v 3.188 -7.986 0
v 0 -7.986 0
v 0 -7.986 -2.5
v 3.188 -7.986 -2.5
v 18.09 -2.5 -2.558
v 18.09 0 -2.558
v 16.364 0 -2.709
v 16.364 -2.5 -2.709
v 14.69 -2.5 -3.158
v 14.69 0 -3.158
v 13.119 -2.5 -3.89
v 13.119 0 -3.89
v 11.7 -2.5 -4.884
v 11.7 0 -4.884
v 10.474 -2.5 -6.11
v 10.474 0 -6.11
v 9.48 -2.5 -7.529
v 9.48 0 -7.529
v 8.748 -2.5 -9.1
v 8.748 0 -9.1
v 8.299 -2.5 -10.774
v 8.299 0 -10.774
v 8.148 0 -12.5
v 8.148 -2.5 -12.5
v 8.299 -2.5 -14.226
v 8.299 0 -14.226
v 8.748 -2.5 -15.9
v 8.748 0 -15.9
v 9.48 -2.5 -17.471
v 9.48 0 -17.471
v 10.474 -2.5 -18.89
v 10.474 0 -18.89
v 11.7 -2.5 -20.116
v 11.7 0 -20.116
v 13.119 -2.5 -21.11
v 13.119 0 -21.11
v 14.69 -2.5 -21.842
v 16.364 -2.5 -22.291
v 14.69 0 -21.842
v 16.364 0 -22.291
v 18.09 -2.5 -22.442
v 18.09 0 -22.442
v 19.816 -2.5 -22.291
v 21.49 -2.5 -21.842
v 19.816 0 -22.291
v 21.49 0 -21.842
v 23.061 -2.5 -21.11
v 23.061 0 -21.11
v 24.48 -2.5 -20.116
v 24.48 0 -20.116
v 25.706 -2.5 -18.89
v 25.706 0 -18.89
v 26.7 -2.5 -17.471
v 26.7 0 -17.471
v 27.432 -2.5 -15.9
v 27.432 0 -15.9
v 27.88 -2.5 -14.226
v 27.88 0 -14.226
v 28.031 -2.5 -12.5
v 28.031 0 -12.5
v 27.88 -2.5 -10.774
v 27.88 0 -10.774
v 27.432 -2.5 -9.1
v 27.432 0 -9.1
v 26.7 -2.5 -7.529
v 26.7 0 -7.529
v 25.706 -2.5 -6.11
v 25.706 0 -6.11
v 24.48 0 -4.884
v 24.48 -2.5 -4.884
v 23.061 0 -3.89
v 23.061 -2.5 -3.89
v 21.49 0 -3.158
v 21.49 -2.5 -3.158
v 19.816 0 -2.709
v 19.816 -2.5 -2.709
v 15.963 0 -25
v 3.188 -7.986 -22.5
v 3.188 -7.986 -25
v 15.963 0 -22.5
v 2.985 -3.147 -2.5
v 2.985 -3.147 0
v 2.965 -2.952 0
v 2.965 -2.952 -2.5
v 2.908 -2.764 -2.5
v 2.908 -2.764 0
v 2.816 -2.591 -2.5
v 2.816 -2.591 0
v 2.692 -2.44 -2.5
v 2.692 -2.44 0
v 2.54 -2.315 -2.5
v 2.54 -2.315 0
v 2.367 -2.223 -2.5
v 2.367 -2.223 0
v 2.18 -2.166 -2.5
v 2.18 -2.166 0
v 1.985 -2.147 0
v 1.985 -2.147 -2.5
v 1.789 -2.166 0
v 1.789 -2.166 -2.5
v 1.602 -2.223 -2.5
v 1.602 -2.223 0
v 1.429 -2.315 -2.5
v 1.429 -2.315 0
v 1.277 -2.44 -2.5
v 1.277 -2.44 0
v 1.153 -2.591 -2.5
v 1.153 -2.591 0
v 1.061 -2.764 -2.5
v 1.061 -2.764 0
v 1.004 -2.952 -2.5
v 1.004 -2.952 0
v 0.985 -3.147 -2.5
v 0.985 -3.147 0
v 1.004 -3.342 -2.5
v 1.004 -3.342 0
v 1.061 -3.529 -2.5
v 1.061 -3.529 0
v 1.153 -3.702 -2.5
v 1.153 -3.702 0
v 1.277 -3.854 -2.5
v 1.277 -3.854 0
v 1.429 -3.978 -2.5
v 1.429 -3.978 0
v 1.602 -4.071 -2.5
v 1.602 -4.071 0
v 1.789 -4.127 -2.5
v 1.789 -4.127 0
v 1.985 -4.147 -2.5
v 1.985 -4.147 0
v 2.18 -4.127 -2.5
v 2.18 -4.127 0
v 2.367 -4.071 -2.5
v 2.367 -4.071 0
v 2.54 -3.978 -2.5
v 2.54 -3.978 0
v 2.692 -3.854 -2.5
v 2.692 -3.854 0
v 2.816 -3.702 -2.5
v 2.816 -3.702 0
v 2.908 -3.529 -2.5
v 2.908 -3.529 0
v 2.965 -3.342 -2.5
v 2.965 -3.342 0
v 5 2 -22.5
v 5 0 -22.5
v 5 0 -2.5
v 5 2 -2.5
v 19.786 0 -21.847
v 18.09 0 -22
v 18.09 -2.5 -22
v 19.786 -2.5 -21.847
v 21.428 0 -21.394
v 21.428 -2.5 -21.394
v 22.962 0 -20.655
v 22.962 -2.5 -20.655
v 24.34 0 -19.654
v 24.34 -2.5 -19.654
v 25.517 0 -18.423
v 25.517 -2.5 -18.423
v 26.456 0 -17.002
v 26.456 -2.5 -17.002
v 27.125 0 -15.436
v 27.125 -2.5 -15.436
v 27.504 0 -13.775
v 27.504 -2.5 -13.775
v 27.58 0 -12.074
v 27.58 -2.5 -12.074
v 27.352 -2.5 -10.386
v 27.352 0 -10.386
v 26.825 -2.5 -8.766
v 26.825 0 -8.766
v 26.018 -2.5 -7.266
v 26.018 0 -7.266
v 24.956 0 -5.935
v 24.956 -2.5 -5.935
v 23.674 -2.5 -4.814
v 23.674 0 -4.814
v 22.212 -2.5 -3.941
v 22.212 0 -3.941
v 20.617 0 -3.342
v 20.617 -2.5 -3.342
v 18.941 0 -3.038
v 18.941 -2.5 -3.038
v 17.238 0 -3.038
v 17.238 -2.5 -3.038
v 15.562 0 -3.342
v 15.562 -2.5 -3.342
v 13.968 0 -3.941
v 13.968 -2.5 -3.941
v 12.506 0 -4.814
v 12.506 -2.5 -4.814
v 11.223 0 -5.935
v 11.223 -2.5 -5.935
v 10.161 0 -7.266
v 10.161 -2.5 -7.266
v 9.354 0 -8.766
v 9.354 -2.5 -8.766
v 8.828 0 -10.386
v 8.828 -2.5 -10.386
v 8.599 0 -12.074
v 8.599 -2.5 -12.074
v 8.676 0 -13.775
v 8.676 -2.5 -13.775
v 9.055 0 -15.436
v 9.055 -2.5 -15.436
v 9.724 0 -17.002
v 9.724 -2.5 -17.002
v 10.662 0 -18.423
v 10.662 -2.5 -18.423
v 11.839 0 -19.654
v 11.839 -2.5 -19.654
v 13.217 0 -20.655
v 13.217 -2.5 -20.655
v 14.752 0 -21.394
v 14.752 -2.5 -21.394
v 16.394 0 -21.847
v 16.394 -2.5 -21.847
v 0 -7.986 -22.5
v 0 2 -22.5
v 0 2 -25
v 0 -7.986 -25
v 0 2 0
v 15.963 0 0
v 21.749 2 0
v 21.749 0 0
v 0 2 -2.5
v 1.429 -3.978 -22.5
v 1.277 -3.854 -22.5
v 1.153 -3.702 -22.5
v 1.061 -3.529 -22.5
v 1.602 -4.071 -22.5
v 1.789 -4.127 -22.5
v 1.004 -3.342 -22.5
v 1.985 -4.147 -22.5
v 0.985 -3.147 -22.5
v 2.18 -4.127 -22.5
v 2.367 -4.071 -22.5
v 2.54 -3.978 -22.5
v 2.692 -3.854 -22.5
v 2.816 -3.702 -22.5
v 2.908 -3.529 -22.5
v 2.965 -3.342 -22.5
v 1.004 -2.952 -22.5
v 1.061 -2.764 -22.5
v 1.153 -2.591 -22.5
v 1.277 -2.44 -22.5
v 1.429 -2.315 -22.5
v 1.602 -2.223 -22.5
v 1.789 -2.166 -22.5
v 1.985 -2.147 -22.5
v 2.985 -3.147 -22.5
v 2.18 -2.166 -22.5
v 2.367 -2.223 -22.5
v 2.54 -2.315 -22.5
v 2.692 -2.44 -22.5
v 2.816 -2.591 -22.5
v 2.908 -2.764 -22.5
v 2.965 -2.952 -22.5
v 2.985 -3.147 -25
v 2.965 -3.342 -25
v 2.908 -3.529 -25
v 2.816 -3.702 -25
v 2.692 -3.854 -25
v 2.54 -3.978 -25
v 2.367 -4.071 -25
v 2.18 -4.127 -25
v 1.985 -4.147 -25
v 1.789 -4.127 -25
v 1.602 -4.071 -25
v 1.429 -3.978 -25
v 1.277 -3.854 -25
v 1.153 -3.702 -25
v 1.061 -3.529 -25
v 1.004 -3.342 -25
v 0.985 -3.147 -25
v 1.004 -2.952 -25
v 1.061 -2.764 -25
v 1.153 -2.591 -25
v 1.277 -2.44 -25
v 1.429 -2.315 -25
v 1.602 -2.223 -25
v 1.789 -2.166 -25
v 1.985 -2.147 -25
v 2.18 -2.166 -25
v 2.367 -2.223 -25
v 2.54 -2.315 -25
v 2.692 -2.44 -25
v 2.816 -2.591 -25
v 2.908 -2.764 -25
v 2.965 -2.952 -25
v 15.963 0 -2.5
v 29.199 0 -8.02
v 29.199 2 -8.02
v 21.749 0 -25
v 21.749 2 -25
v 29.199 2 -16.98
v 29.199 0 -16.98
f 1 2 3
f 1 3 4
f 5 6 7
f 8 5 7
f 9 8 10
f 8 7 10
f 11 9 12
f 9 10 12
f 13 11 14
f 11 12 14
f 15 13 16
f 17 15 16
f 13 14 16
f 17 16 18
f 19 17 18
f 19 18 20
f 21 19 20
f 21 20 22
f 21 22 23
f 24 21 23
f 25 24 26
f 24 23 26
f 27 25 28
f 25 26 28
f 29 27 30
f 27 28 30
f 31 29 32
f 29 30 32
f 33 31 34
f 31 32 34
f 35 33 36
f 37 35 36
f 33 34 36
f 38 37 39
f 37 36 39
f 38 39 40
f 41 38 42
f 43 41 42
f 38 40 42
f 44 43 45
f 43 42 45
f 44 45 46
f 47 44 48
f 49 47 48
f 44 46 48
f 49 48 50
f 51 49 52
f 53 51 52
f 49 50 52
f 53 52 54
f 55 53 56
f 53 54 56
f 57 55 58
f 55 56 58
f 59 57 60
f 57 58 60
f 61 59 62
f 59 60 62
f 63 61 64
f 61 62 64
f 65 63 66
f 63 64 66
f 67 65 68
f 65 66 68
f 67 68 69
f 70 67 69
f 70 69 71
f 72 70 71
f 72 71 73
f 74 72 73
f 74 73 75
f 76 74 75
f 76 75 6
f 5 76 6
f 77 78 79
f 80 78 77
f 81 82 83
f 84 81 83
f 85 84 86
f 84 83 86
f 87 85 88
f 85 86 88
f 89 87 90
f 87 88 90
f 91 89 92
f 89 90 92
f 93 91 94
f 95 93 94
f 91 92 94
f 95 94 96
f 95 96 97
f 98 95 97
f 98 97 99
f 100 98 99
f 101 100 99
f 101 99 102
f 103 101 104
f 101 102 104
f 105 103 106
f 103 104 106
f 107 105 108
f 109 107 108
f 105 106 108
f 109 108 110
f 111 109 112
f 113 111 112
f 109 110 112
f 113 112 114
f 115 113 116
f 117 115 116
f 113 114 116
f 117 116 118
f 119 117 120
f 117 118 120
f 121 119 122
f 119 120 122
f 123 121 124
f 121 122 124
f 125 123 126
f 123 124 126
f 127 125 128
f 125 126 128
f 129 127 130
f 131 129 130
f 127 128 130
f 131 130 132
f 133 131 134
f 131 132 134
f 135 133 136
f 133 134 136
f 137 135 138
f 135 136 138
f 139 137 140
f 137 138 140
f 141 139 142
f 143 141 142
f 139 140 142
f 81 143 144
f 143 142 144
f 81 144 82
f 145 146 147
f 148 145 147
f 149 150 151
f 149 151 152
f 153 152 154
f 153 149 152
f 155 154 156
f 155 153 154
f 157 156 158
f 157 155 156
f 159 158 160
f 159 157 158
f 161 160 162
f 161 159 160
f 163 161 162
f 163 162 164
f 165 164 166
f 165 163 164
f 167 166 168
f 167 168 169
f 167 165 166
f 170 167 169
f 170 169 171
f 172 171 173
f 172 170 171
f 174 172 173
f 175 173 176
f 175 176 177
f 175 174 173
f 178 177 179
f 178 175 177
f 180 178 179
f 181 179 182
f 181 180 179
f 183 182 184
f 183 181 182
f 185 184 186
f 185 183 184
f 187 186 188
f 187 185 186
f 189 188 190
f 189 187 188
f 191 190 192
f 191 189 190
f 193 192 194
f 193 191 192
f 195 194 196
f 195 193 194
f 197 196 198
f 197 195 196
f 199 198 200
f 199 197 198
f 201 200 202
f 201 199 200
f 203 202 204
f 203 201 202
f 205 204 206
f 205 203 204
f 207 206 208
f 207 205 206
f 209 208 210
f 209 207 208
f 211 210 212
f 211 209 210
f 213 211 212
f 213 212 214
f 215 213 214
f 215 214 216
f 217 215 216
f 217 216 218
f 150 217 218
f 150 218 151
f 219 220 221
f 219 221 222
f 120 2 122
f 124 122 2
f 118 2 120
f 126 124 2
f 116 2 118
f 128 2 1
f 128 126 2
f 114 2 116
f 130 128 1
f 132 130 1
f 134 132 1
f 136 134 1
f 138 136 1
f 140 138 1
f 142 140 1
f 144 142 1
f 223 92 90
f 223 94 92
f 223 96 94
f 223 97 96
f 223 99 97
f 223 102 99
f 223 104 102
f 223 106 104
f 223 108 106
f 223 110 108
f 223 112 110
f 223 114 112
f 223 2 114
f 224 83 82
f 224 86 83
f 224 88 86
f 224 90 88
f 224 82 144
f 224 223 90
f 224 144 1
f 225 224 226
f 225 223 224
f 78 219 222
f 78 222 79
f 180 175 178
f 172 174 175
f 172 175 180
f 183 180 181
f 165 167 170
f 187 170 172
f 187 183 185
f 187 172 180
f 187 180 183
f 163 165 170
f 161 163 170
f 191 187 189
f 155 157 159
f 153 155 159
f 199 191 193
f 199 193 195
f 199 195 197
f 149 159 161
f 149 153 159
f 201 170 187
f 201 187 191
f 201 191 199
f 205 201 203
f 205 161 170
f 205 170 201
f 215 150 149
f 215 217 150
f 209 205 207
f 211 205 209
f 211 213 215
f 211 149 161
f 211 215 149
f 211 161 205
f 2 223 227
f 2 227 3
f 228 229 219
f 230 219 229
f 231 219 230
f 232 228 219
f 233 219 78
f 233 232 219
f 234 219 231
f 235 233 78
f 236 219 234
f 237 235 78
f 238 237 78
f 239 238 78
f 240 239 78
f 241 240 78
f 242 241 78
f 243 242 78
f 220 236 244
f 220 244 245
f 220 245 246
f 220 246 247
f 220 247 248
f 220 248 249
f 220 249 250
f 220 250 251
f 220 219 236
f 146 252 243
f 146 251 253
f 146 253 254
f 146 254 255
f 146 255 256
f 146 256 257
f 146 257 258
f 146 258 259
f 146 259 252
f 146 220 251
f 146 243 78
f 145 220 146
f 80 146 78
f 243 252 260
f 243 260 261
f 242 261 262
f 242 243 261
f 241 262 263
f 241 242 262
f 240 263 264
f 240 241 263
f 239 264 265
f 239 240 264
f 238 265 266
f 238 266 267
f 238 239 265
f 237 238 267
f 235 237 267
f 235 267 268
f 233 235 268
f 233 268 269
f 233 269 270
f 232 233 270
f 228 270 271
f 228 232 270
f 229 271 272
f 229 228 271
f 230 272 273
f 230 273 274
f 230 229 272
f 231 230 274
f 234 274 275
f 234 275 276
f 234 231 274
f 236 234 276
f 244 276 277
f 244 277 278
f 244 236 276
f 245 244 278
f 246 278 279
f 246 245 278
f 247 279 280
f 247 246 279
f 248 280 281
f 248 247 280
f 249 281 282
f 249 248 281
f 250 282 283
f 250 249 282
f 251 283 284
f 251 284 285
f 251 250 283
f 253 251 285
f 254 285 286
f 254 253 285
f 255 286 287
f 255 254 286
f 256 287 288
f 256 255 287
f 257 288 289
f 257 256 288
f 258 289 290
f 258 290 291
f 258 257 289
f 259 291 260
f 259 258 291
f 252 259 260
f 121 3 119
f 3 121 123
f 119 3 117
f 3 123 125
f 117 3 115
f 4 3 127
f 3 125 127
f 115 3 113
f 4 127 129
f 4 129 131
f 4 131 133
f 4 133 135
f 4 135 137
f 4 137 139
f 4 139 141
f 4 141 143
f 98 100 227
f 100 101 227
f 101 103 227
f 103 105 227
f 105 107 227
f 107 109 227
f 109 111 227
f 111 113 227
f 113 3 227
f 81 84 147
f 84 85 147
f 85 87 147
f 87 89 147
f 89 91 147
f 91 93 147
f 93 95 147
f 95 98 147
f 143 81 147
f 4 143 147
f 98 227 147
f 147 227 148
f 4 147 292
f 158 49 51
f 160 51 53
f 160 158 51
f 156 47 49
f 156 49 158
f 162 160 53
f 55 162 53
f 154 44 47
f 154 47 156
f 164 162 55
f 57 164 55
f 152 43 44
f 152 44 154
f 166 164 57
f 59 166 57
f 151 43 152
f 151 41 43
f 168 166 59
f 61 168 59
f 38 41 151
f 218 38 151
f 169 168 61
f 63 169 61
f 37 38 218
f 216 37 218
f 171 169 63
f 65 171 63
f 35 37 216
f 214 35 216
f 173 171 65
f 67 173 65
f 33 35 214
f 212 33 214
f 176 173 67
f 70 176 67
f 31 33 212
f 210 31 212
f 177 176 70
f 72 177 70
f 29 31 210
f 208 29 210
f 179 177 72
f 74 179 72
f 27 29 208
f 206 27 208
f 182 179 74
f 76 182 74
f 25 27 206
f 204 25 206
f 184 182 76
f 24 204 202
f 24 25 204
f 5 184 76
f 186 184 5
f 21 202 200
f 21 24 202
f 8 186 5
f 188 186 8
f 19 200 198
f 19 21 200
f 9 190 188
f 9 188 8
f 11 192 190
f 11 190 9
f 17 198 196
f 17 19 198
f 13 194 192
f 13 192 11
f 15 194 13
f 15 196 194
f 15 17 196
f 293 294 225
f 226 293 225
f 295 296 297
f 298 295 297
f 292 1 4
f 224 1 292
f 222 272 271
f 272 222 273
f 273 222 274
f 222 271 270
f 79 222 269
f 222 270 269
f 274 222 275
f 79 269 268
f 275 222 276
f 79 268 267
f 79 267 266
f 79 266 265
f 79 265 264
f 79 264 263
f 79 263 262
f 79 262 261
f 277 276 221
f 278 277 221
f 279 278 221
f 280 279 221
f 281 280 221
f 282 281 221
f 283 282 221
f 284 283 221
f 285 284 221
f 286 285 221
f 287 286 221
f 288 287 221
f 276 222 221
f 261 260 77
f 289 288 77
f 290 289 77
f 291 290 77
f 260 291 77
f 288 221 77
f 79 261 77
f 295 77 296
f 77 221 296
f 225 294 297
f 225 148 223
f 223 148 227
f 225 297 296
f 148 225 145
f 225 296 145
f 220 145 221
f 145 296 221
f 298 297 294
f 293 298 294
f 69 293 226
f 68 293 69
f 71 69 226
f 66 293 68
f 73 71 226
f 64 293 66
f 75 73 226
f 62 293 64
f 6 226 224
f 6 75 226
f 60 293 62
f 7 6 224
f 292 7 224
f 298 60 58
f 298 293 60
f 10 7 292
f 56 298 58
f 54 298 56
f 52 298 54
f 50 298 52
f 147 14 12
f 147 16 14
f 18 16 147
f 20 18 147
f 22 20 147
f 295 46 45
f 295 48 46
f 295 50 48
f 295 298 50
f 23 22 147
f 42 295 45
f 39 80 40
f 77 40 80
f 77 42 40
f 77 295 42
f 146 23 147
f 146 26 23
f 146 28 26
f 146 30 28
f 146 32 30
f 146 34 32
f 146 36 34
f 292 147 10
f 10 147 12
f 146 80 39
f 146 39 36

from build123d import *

# Parameters (mm, degrees)
BOSS_EXTRUDE1_DEPTH = 2
BOSS_EXTRUDE2_DEPTH = 2
SKETCH3_R           = 1
BOSS_EXTRUDE3_DEPTH = 2.5
SKETCH5_R           = 1
BOSS_EXTRUDE5_DEPTH = 2.5
SKETCH6_R           = 1
CUT_EXTRUDE1_DEPTH  = 2.5
BOSS_EXTRUDE6_START = -2.5
SKETCH8_R           = 1
BOSS_EXTRUDE6_DEPTH = 2.5
CUT_EXTRUDE2_DEPTH  = 2.5
SKETCH10_R          = 9.941576331
SKETCH10_R_2        = 9.5
BOSS_EXTRUDE9_DEPTH = 2.5


with BuildPart() as part:
    # Sketch1 → Boss-Extrude1 (new body)
    with BuildSketch(Plane(origin=(0, 0, 0), x_dir=(1, 0, 0), z_dir=(0, 1, 0))):
        Polygon((0, 2.5), (0, 0), (26, 0), (26, 25), (0, 25), (0, 22.5), (5, 22.5), (5, 2.5), align=None)
    extrude(amount=BOSS_EXTRUDE1_DEPTH)

    # Sketch2 → Boss-Extrude2 (add)
    with BuildSketch(Plane(origin=(0, 2, 0), x_dir=(1, 0, 0), z_dir=(0, 1, 0))):
        Polygon((26, 25), (40.579221248, 15.4966373), (40.579221248, 9.198619924), (26, 0), align=None)
    extrude(amount=-BOSS_EXTRUDE2_DEPTH)

    # Sketch3 → Boss-Extrude3 (add)
    with BuildSketch(Plane.XY):
        Polygon((15.962952465, 0), (0, 0), (0, -7.986136178), (3.187790207, -7.986136178), align=None)
        with Locations((1.984518411, -4.657937593)):
            Circle(SKETCH3_R, mode=Mode.SUBTRACT)
    extrude(amount=-BOSS_EXTRUDE3_DEPTH)

    # Sketch5 → Boss-Extrude5 (add)
    with BuildSketch(Plane.XY):
        with Locations((1.984518411, -4.657937593)):
            Circle(SKETCH5_R)
    extrude(amount=-BOSS_EXTRUDE5_DEPTH)

    # Sketch6 → Cut-Extrude1 (cut)
    with BuildSketch(Plane.XY):
        with Locations((1.984518411, -3.146677254)):
            Circle(SKETCH6_R)
    extrude(amount=-CUT_EXTRUDE1_DEPTH, mode=Mode.SUBTRACT)

    # Sketch8 → Boss-Extrude6 (add)
    with BuildSketch(Plane(origin=(0, 0, -25), x_dir=(-1, 0, 0), z_dir=(0, 0, -1)).offset(BOSS_EXTRUDE6_START)):
        Polygon((0, 0), (0, -7.986136178), (-3.187790207, -7.986136178), (-15.962952465, 0), align=None)
        with Locations(Location((-1.984518411, -3.146677254, 0), (0, 0, 180))):
            Circle(SKETCH8_R, mode=Mode.SUBTRACT)
    extrude(amount=BOSS_EXTRUDE6_DEPTH)

    # Sketch9 → Cut-Extrude2 (cut)
    with BuildSketch(Plane(origin=(0, 2, 0), x_dir=(1, 0, 0), z_dir=(0, 1, 0))):
        Polygon((21.748897696, 25), (29.198942219, 16.980267325), (29.198942219, 8.019732675), (21.748897696, 0), (26, 0), (40.579221248, 9.198619924), (40.579221248, 15.4966373), (26, 25), align=None)
    extrude(amount=-CUT_EXTRUDE2_DEPTH, mode=Mode.SUBTRACT)

    # Sketch10 → Boss-Extrude9 (add)
    with BuildSketch(Plane.XZ):
        with Locations(Location((18.089845789, -12.5, 0), (0, 0, 90))):
            Circle(SKETCH10_R)
        with Locations(Location((18.089845789, -12.5, 0), (0, 0, 270))):
            Circle(SKETCH10_R_2, mode=Mode.SUBTRACT)
    extrude(amount=BOSS_EXTRUDE9_DEPTH)


solid = part.part
